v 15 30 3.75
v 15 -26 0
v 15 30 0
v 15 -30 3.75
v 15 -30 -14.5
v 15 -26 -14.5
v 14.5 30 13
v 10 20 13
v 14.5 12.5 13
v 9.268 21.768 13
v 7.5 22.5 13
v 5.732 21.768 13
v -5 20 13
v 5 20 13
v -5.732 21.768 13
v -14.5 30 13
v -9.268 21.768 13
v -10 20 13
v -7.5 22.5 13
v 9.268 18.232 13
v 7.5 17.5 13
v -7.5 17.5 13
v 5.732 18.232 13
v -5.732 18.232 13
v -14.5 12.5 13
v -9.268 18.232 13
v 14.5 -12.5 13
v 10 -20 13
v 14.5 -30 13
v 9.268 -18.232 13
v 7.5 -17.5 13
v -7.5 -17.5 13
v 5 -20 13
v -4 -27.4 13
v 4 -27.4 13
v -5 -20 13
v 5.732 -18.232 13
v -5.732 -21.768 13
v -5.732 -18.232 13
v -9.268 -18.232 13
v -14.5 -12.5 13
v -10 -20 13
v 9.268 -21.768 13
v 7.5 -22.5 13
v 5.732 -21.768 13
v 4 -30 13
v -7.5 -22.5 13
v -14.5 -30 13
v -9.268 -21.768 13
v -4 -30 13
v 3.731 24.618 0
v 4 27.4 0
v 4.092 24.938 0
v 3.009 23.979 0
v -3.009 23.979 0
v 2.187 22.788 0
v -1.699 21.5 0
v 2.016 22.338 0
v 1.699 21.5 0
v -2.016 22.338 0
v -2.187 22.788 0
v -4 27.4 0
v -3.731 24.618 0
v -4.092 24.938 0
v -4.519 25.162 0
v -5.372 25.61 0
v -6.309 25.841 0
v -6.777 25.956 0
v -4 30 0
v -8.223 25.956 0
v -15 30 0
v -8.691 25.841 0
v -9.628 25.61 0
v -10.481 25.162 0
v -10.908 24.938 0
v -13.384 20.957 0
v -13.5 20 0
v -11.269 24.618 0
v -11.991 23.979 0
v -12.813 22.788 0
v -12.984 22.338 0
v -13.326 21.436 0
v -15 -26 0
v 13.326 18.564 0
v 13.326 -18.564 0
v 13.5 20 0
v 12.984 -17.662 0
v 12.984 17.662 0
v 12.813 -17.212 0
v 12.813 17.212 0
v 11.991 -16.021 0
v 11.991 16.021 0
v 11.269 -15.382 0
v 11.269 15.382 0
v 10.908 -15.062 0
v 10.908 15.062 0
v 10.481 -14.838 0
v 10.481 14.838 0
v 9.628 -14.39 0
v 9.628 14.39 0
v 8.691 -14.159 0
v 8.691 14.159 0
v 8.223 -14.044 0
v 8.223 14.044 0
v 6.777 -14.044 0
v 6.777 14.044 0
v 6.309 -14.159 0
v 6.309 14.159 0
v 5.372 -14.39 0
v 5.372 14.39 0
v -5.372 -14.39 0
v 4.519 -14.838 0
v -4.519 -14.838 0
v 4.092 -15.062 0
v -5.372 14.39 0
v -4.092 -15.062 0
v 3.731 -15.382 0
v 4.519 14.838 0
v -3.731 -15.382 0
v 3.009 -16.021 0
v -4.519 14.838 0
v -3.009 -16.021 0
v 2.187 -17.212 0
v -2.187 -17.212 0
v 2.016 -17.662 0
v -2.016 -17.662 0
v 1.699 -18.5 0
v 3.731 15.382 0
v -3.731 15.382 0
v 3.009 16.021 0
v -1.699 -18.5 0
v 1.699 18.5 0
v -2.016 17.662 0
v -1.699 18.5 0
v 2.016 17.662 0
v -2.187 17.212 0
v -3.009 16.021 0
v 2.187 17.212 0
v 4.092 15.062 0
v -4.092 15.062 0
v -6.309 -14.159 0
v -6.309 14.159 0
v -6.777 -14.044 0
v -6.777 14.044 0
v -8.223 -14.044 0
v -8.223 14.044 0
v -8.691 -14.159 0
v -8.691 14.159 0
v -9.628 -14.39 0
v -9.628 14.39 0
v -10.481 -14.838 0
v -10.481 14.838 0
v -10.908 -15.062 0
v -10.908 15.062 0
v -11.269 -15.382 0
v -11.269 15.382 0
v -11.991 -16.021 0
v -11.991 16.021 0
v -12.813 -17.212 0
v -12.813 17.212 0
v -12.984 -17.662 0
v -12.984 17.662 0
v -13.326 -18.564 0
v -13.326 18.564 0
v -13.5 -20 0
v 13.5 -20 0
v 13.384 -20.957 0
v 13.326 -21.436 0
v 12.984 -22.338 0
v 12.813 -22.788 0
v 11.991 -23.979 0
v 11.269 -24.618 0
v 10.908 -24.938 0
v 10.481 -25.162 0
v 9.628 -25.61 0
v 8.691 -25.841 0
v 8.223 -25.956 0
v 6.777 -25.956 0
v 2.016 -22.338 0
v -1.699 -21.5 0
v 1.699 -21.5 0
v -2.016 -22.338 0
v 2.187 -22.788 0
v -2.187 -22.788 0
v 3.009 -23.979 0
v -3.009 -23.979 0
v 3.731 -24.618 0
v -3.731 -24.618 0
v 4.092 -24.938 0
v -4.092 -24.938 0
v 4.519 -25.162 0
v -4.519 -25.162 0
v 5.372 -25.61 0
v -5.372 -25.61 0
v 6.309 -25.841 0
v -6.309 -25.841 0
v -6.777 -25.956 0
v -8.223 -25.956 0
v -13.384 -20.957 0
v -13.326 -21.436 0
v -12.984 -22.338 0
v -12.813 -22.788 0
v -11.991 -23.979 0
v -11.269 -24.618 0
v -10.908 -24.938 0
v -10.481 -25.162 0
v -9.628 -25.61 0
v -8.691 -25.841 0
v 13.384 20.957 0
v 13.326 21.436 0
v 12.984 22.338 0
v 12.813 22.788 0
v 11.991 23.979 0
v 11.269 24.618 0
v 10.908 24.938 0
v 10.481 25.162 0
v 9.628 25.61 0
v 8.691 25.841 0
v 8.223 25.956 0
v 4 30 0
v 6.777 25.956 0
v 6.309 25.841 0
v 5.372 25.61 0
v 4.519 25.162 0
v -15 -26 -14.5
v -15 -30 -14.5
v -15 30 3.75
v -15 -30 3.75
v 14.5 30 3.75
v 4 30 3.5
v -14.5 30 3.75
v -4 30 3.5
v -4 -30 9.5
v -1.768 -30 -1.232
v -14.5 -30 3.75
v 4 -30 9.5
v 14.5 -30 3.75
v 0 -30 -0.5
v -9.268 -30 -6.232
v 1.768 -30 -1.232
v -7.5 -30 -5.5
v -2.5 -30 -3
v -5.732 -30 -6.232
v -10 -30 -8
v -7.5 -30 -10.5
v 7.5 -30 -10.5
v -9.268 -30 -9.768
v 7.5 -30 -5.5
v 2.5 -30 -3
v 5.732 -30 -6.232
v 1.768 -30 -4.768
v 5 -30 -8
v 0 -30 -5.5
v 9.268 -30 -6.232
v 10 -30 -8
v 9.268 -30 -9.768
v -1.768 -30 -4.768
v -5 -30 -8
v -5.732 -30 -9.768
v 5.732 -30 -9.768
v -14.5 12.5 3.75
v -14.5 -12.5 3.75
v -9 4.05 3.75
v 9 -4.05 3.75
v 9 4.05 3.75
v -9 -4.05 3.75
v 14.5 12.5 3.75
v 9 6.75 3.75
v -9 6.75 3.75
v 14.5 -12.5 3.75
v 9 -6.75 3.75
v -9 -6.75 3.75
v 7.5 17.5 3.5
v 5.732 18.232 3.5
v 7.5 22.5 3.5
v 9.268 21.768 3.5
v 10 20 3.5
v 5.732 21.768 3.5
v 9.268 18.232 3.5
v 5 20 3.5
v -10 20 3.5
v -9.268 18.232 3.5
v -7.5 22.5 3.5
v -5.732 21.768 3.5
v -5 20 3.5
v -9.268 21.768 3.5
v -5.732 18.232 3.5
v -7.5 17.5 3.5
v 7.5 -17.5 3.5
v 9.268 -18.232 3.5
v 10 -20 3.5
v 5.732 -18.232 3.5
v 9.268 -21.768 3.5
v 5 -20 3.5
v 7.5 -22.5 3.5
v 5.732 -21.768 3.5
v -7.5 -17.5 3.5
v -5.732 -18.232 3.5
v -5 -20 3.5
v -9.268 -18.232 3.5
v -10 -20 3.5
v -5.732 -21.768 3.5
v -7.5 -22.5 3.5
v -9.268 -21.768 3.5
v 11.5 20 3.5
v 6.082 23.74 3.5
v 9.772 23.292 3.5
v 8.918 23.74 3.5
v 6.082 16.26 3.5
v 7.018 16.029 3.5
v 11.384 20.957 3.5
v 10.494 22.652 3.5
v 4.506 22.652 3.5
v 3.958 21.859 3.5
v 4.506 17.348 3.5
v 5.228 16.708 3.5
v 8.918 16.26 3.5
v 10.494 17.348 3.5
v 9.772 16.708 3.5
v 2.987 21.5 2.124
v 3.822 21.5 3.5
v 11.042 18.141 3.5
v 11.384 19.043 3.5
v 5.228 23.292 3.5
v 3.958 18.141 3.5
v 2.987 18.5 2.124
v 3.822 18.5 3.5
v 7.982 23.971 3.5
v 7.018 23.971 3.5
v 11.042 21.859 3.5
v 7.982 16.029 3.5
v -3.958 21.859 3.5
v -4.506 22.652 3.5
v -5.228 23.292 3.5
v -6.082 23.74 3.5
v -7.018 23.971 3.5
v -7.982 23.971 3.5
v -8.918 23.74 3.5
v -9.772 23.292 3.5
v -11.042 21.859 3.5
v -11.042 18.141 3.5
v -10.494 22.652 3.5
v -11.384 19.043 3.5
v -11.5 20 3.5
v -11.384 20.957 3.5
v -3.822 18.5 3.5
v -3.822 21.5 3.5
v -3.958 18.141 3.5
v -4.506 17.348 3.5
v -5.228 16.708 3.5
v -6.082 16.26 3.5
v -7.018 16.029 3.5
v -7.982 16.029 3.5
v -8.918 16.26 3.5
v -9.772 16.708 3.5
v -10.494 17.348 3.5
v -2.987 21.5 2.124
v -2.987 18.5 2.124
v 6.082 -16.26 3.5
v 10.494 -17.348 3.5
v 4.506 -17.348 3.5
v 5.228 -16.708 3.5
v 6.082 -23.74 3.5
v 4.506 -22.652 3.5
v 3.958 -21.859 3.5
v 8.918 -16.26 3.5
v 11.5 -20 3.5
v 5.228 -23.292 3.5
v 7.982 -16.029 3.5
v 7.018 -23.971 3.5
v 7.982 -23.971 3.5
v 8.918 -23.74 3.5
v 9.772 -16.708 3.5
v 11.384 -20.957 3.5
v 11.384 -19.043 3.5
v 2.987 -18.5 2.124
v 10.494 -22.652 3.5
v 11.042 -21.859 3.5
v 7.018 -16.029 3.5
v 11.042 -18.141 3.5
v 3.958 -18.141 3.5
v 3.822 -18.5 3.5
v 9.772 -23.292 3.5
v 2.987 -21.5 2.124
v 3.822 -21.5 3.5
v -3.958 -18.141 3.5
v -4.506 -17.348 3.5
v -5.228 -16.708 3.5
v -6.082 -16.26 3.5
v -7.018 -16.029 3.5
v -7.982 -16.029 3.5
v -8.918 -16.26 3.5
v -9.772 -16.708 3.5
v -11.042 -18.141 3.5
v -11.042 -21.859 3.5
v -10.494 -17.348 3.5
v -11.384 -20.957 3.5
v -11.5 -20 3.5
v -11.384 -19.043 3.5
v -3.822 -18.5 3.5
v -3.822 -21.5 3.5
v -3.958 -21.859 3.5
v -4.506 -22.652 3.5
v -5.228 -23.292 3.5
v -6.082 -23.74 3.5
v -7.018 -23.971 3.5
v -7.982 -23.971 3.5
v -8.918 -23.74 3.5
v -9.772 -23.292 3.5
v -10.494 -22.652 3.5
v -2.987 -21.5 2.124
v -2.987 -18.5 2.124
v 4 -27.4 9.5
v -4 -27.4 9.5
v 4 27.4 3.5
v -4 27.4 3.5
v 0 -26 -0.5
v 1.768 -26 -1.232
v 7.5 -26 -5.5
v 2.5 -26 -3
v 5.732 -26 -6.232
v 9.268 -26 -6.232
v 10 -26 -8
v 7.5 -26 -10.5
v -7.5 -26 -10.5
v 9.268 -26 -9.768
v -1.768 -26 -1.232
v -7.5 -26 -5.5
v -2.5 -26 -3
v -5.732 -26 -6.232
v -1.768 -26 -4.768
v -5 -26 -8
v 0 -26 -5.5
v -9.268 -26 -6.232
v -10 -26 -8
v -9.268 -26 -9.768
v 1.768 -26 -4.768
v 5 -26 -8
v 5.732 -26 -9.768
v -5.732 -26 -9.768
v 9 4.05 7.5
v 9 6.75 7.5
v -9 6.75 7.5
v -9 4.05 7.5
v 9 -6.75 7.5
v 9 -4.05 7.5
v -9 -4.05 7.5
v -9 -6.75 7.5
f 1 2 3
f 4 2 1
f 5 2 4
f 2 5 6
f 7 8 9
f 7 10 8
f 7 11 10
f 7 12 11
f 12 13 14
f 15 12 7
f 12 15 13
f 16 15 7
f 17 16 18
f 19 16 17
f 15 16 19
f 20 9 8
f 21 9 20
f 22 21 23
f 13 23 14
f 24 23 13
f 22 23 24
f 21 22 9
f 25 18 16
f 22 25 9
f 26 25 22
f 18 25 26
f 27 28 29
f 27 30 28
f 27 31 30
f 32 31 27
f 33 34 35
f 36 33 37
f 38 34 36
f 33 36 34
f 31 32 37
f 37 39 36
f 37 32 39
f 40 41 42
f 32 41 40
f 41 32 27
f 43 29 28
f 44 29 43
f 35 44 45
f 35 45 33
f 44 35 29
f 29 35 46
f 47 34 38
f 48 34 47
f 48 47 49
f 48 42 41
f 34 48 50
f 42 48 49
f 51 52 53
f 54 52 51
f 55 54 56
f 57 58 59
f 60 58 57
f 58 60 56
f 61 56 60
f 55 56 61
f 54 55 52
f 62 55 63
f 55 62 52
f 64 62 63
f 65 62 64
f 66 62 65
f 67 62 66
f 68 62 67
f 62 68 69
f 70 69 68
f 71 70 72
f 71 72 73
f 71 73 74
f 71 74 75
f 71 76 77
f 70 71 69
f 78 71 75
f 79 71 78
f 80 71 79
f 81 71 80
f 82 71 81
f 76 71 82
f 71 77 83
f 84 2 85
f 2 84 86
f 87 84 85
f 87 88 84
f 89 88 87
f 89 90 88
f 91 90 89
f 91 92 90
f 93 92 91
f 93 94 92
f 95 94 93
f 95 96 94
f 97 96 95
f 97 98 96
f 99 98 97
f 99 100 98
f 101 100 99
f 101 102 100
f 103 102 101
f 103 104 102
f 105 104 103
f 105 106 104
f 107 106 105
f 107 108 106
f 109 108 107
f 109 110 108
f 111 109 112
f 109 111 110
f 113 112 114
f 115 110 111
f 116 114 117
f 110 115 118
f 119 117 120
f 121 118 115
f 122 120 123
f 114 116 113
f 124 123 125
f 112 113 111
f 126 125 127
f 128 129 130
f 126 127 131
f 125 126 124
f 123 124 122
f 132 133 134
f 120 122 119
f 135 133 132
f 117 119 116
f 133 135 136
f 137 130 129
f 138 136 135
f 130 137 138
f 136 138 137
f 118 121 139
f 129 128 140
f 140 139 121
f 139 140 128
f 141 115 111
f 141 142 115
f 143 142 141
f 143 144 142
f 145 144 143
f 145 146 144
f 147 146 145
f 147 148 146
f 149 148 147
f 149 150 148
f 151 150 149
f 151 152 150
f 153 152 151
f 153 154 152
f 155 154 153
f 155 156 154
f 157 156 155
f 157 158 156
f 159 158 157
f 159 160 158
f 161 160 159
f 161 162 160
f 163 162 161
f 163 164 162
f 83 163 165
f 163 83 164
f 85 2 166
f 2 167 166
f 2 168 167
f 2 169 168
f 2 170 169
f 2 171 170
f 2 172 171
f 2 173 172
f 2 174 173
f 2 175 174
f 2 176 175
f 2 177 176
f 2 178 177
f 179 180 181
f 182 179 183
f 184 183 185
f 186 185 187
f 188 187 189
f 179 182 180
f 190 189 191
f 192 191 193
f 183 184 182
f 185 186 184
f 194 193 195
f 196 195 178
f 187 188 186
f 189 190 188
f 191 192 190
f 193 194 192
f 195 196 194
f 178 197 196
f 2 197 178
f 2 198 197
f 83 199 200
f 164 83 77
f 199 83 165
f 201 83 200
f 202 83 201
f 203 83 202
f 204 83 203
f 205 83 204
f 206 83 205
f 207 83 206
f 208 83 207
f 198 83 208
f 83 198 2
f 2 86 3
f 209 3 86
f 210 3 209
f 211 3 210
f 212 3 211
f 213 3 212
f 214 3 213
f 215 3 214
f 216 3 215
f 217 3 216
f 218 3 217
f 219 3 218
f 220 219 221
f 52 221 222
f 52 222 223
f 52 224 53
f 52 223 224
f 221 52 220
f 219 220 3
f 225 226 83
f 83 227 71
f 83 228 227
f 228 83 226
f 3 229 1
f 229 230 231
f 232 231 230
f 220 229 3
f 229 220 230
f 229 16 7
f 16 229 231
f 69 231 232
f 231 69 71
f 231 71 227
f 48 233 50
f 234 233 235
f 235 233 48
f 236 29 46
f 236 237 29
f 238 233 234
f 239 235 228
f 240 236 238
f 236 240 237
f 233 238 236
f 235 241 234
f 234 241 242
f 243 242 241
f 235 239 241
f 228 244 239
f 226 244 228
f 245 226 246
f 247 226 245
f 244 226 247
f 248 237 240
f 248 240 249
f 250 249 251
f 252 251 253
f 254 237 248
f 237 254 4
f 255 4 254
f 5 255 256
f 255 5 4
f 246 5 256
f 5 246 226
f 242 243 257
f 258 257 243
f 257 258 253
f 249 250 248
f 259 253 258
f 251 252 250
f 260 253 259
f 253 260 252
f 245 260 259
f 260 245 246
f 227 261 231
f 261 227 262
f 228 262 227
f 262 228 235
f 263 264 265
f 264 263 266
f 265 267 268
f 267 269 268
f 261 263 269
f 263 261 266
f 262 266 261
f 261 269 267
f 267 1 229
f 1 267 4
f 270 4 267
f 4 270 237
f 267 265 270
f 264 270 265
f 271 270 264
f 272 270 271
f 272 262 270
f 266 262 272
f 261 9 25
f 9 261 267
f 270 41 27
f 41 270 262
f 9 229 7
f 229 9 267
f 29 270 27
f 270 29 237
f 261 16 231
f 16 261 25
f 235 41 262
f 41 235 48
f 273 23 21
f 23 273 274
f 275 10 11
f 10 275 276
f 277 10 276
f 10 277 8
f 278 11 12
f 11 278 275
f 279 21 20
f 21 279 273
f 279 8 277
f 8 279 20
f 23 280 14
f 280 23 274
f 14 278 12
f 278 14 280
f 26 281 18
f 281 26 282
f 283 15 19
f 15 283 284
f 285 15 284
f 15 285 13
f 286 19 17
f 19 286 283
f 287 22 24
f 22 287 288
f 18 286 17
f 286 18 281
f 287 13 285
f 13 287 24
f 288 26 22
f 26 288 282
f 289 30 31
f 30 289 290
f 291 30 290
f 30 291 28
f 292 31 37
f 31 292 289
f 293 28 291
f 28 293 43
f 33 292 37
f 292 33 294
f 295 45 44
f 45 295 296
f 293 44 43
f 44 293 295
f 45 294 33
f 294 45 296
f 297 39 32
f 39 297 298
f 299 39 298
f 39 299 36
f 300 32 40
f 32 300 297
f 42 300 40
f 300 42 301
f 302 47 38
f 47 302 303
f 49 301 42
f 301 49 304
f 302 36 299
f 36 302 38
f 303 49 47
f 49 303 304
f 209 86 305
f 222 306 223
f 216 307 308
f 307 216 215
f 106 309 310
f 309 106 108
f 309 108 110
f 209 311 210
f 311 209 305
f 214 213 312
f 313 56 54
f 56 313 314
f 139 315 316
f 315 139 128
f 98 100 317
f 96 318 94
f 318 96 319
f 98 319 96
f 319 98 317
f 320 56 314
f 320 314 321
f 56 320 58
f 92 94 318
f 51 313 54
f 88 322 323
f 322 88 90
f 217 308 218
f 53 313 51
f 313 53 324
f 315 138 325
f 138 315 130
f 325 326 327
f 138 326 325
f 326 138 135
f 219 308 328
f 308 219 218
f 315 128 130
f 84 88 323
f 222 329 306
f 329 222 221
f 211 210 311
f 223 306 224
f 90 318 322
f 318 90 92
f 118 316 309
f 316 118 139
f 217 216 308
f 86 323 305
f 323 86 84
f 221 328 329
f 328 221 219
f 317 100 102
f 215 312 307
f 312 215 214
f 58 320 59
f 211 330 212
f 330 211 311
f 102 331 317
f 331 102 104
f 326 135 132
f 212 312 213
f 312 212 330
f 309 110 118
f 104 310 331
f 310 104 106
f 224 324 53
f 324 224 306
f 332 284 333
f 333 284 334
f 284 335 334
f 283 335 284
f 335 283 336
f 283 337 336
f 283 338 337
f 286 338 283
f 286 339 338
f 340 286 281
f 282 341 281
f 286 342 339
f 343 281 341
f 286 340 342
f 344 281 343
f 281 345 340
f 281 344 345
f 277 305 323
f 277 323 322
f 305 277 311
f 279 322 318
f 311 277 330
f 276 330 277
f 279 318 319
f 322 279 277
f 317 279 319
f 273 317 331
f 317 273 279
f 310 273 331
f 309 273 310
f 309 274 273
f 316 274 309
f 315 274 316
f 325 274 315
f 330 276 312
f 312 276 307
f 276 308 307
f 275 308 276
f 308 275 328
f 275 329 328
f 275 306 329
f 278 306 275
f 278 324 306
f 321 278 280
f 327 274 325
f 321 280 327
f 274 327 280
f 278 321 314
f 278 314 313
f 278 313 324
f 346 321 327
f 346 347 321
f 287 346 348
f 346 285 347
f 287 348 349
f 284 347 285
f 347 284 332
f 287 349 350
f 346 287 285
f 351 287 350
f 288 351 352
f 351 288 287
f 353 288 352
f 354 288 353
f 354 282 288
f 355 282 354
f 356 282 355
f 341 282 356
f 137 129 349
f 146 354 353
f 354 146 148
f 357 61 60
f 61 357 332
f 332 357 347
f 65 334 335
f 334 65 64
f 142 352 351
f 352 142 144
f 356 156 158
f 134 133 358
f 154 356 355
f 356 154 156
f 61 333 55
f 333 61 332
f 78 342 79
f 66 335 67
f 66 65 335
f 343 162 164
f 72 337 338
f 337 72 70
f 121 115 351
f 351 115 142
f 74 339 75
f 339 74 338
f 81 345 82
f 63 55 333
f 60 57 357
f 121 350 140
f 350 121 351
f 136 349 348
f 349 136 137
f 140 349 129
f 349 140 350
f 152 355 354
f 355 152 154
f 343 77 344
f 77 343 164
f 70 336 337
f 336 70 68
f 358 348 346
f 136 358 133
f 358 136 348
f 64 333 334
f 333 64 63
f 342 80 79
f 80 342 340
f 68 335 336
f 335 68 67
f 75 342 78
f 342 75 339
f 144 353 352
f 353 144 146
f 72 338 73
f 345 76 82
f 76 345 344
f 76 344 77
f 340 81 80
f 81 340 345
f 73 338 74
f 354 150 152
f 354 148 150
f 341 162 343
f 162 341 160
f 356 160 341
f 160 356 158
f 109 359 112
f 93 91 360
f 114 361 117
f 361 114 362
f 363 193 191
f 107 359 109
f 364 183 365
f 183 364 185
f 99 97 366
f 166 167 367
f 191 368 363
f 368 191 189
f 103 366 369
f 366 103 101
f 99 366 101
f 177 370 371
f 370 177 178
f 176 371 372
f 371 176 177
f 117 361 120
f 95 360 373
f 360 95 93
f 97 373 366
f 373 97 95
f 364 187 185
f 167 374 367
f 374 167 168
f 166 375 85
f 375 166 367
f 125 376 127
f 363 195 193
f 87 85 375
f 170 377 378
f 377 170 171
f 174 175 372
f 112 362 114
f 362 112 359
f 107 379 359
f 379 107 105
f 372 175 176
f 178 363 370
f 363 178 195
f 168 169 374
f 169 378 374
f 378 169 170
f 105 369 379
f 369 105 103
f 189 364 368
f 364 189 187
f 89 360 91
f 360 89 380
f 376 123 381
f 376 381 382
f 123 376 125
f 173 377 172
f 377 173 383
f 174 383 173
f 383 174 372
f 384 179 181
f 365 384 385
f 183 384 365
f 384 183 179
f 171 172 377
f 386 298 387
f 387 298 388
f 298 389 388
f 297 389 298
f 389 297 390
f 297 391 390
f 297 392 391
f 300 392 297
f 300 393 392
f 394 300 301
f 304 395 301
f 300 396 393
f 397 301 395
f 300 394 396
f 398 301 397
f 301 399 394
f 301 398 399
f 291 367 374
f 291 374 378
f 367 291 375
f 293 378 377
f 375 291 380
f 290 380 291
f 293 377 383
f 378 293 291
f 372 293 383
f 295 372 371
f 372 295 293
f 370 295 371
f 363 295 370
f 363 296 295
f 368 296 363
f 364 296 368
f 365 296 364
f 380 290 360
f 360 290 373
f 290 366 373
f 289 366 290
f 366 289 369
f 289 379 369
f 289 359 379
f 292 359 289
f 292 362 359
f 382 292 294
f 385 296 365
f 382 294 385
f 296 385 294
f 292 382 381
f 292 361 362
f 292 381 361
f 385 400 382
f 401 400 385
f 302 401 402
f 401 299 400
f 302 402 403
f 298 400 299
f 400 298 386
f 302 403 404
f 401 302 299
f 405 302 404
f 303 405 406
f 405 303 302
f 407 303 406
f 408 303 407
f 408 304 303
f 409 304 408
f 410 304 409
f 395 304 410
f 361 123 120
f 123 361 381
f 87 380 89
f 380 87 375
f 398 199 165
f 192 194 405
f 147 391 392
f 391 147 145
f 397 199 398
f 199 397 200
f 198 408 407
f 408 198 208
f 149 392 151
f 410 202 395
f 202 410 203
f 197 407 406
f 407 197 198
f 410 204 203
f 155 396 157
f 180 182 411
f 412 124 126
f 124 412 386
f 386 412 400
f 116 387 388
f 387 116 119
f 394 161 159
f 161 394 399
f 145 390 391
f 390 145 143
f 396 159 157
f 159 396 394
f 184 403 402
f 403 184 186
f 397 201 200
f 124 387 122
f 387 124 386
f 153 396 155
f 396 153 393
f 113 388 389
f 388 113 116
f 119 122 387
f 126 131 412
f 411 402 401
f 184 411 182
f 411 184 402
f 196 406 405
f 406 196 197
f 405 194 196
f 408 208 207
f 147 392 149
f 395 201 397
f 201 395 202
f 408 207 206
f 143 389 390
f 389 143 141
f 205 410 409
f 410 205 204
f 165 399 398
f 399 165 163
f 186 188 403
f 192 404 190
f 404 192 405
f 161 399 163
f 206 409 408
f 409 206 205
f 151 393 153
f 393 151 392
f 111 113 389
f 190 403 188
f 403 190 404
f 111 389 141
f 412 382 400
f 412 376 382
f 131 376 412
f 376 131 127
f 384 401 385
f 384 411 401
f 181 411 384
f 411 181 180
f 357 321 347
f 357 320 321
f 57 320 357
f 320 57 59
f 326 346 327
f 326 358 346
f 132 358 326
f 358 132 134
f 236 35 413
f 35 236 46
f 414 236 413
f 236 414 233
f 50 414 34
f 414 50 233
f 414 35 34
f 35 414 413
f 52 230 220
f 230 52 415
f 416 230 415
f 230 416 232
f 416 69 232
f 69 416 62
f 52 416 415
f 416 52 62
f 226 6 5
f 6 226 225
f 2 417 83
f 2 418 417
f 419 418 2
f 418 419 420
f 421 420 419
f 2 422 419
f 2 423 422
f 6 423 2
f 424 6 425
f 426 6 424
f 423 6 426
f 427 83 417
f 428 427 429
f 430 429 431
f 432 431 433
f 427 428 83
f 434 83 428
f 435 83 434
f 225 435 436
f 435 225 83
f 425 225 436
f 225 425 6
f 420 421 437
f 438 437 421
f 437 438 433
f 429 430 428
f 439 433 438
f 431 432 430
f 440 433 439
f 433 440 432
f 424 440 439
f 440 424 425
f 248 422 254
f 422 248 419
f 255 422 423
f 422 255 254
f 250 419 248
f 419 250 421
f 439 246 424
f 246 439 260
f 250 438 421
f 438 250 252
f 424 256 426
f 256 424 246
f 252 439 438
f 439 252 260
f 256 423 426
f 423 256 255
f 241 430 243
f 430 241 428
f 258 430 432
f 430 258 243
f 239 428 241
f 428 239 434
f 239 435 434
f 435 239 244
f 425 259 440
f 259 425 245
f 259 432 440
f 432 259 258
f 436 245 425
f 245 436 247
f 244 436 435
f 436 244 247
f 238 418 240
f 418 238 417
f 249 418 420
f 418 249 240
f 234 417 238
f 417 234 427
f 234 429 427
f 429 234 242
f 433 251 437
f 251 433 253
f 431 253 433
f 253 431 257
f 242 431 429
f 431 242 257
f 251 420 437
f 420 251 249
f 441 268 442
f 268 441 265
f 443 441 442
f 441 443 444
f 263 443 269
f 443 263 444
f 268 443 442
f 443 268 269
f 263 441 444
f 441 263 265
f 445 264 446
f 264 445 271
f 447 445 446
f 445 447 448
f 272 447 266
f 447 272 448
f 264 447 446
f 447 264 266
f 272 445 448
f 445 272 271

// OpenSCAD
//block shape
x=30;
y=60;
z=13;

// track channel
f=x+10;
g=25;
h=9.5;
// block top
e=20;
r=y+10;
t=16.5;

// spacing of screw holes
cx=15;
cy=40;
dx=15;
dy=45;


difference()
{
    translate([0,0,z]/2) cube ([x,y,z],center=true);
    translate([0,0,z+4]/2) cube([f,g,h],center=true);
    translate([49,0,z+11]/2) cube ([e,r,t],center=true);
        translate([-49,0,z+11]/2) cube ([e,r,t],center=true);

  translate([cx,cy,0]/2) cylinder(d=5, h=50,  center=true);
  translate([-cx,cy,0]/2) cylinder(d=5, h=50,  center=true);
    translate([cx,-cy,0]/2) cylinder(d=5, h=50,  center=true);
    translate([-cx,-cy,0]/2) cylinder(d=5, h=50,  center=true);
  translate([dy,dy,0]/2) cylinder(d=5, h=50,  center=true);
  translate([-dy,dy,0]/2) cylinder(d=5, h=50,  center=true);
    translate([dy,-dy,0]/2) cylinder(d=5, h=50,  center=true);
    translate([-dy,-dy,0]/2) cylinder(d=5, h=50,  center=true);  
    translate([dy,dx,0]/2) cylinder(d=5, h=50,  center=true);
  translate([-dy,dx,0]/2) cylinder(d=5, h=50,  center=true);  
  translate([dy,-dx,0]/2) cylinder(d=5, h=50,  center=true);
  translate([-dy,-dx,0]/2) cylinder(d=5, h=50,  center=true);  
    
 translate([cx,cy,0]/2)  cylinder(d1=16, d2=8, h=7,  center=true);
 translate([-cx,cy,0]/2) cylinder(d1=16, d2=8, h=7, center=true);
    translate([cx,-cy,0]/2) cylinder(d1=16, d2=8, h=7,  center=true);
    translate([-cx,-cy,0]/2) cylinder(d1=16, d2=8, h=7,  center=true);    
// zip tie knotches    
    translate([0,-cy/2,11.5-10]) cube([18,3,4],center=true);
    translate([0,cy/2,11.5-10]) cube([18,3,4],center=true);
// removal knotches
       translate([0,-(6.8+51)/2,11.5]) cube([8,3,4],center=true);
   translate([0,(6.8+51)/2,11.5-10]) cube([8,3,4],center=true);
   translate([(6.8+51)/2,0,11.5-11]) cube([3,8,2],center=true);
   translate([-(6.8+51)/2,0,11.5-11]) cube([3,8,2],center=true);
}

difference ()
{
    translate([0,-28,-7]) cube([30,4,15],center=true);
    translate([7.5,-28,-8])rotate([90,0,0]) cylinder(d=5, h=60, center=true);
      translate([-7.5,-28,-8])rotate([90,0,0]) cylinder(d=5, h=60, center=true);
      translate([0,-28,-3])rotate([90,0,0]) cylinder(d=5, h=60, center=true);
}

translate([0,(6.8+4)/2,z-8]) cube([18,2.7,5],center=true);
translate([0,-(6.8+4)/2,z-8]) cube([18,2.7,5],center=true);
